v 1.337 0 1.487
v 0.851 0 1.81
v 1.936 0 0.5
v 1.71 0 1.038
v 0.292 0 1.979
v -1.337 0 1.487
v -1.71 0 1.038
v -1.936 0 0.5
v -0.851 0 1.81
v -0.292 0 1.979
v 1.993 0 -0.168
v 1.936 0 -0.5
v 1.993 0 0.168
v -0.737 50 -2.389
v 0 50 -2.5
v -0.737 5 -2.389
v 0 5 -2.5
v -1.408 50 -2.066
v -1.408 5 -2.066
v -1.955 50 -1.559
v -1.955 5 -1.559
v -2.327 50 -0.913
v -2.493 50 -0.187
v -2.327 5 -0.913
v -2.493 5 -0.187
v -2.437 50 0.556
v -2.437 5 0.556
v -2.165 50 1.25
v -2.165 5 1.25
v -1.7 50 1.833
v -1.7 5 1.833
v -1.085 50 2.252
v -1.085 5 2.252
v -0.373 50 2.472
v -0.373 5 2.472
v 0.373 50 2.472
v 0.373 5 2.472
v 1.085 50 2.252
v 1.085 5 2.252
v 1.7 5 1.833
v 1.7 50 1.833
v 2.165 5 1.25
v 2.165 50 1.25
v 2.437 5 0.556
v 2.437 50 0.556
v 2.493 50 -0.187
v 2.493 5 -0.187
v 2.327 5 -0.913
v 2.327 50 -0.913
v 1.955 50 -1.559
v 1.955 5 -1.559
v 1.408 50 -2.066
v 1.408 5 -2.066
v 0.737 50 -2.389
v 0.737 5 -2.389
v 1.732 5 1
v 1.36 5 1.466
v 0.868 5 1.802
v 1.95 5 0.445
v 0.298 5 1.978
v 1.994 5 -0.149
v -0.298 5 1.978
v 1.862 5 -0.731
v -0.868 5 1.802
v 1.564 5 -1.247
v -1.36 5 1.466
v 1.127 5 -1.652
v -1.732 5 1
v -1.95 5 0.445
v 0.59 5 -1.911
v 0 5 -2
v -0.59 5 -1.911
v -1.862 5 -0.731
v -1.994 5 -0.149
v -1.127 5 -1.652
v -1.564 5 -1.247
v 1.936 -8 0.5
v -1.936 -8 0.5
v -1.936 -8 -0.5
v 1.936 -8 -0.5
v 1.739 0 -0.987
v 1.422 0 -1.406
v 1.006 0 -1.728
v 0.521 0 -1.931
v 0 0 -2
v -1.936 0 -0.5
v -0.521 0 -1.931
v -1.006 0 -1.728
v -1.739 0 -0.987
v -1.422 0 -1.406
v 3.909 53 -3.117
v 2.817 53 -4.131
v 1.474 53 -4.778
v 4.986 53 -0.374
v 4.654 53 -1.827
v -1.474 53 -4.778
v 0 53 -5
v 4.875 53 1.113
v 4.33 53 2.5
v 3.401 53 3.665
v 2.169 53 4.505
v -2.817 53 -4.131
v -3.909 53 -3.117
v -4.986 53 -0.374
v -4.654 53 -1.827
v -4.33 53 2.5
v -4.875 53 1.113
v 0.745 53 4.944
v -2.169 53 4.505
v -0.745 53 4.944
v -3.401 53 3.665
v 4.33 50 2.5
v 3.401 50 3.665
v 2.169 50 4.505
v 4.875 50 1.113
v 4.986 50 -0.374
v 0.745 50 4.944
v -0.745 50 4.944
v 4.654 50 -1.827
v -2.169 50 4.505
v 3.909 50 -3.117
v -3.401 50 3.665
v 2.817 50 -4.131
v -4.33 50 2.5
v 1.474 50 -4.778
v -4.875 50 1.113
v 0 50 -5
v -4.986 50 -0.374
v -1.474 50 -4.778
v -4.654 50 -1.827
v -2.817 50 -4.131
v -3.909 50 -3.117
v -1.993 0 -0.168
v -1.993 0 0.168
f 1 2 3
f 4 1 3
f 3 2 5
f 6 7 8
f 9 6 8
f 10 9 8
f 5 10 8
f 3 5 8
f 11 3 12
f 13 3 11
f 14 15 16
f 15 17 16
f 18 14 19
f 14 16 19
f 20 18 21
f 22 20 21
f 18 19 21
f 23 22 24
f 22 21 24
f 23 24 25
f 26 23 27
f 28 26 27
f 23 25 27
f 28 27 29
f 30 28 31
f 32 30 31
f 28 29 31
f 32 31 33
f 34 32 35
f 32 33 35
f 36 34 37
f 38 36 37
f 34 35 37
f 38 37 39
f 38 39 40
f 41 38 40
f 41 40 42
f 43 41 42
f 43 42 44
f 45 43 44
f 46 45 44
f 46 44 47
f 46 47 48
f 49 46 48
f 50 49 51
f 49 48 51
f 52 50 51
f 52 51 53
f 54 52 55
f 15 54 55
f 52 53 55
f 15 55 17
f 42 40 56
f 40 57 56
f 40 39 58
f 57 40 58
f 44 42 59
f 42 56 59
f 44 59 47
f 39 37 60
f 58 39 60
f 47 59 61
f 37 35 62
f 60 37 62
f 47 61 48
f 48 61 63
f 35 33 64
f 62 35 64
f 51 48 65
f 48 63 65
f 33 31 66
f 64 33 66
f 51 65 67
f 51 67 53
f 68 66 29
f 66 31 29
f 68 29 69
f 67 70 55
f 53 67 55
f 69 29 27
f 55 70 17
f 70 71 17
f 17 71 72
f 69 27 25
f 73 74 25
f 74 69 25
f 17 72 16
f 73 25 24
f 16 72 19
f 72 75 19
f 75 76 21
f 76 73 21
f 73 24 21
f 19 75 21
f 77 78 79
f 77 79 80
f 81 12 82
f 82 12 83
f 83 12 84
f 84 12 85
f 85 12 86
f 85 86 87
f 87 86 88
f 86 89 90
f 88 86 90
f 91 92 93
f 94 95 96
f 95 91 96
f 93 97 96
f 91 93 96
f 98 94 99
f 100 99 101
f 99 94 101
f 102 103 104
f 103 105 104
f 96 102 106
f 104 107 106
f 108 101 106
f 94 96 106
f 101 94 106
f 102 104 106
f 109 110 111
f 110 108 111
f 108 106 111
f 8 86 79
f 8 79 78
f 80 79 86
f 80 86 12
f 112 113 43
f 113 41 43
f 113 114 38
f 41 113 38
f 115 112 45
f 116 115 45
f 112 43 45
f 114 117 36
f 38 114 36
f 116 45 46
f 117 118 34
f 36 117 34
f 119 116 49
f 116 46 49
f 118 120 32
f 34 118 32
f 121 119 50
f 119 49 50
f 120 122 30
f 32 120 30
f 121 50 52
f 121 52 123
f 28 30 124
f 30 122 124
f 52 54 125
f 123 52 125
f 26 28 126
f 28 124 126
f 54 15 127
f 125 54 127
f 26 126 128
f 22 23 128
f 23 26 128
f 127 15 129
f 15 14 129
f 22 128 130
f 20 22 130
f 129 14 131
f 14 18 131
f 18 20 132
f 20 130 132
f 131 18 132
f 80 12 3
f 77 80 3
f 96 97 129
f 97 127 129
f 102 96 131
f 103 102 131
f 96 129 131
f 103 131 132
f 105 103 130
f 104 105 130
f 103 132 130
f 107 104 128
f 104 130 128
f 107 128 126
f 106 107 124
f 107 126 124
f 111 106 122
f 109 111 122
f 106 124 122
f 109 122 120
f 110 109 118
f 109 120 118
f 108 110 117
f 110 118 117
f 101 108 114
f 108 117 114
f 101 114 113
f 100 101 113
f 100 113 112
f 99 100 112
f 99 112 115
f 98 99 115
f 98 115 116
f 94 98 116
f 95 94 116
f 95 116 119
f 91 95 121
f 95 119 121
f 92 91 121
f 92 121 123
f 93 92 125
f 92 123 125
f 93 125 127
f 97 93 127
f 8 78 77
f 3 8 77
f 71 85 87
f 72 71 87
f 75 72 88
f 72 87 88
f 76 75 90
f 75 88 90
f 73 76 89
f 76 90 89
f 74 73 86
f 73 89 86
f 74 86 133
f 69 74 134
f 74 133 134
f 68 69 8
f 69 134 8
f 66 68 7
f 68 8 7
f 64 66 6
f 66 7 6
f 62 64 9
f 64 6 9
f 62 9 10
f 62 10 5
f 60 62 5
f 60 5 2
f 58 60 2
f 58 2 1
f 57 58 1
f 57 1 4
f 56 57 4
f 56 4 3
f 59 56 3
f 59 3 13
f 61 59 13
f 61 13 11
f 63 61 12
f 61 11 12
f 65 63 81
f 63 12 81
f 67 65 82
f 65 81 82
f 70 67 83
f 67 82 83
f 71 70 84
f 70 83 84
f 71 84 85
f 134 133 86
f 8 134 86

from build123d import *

# Parameters (mm, degrees)
SKETCH4_W           = 3.872983346
SKETCH4_H           = 1
BOSS_EXTRUDE1_DEPTH = 8


with BuildPart() as part:
    # Sketch2 → Revolve1 (revolve)
    with BuildSketch(Plane.XY, mode=Mode.PRIVATE) as revolve1_sk:
        Polygon((0, 0), (0, 50), (0, 53), (5, 53), (5, 50), (2.5, 50), (2.5, 5), (2, 5), (2, 0), align=None)
    revolve(revolve1_sk.sketch.rotate(Axis((0, 0, 0), (0, 1, 0)), 90), axis=Axis((0, 0, 0), (0, 1, 0)))

    # Sketch4 → Boss-Extrude1 (add)
    with BuildSketch(Plane.XZ):
        Rectangle(SKETCH4_W, SKETCH4_H)
    extrude(amount=BOSS_EXTRUDE1_DEPTH)


solid = part.part
